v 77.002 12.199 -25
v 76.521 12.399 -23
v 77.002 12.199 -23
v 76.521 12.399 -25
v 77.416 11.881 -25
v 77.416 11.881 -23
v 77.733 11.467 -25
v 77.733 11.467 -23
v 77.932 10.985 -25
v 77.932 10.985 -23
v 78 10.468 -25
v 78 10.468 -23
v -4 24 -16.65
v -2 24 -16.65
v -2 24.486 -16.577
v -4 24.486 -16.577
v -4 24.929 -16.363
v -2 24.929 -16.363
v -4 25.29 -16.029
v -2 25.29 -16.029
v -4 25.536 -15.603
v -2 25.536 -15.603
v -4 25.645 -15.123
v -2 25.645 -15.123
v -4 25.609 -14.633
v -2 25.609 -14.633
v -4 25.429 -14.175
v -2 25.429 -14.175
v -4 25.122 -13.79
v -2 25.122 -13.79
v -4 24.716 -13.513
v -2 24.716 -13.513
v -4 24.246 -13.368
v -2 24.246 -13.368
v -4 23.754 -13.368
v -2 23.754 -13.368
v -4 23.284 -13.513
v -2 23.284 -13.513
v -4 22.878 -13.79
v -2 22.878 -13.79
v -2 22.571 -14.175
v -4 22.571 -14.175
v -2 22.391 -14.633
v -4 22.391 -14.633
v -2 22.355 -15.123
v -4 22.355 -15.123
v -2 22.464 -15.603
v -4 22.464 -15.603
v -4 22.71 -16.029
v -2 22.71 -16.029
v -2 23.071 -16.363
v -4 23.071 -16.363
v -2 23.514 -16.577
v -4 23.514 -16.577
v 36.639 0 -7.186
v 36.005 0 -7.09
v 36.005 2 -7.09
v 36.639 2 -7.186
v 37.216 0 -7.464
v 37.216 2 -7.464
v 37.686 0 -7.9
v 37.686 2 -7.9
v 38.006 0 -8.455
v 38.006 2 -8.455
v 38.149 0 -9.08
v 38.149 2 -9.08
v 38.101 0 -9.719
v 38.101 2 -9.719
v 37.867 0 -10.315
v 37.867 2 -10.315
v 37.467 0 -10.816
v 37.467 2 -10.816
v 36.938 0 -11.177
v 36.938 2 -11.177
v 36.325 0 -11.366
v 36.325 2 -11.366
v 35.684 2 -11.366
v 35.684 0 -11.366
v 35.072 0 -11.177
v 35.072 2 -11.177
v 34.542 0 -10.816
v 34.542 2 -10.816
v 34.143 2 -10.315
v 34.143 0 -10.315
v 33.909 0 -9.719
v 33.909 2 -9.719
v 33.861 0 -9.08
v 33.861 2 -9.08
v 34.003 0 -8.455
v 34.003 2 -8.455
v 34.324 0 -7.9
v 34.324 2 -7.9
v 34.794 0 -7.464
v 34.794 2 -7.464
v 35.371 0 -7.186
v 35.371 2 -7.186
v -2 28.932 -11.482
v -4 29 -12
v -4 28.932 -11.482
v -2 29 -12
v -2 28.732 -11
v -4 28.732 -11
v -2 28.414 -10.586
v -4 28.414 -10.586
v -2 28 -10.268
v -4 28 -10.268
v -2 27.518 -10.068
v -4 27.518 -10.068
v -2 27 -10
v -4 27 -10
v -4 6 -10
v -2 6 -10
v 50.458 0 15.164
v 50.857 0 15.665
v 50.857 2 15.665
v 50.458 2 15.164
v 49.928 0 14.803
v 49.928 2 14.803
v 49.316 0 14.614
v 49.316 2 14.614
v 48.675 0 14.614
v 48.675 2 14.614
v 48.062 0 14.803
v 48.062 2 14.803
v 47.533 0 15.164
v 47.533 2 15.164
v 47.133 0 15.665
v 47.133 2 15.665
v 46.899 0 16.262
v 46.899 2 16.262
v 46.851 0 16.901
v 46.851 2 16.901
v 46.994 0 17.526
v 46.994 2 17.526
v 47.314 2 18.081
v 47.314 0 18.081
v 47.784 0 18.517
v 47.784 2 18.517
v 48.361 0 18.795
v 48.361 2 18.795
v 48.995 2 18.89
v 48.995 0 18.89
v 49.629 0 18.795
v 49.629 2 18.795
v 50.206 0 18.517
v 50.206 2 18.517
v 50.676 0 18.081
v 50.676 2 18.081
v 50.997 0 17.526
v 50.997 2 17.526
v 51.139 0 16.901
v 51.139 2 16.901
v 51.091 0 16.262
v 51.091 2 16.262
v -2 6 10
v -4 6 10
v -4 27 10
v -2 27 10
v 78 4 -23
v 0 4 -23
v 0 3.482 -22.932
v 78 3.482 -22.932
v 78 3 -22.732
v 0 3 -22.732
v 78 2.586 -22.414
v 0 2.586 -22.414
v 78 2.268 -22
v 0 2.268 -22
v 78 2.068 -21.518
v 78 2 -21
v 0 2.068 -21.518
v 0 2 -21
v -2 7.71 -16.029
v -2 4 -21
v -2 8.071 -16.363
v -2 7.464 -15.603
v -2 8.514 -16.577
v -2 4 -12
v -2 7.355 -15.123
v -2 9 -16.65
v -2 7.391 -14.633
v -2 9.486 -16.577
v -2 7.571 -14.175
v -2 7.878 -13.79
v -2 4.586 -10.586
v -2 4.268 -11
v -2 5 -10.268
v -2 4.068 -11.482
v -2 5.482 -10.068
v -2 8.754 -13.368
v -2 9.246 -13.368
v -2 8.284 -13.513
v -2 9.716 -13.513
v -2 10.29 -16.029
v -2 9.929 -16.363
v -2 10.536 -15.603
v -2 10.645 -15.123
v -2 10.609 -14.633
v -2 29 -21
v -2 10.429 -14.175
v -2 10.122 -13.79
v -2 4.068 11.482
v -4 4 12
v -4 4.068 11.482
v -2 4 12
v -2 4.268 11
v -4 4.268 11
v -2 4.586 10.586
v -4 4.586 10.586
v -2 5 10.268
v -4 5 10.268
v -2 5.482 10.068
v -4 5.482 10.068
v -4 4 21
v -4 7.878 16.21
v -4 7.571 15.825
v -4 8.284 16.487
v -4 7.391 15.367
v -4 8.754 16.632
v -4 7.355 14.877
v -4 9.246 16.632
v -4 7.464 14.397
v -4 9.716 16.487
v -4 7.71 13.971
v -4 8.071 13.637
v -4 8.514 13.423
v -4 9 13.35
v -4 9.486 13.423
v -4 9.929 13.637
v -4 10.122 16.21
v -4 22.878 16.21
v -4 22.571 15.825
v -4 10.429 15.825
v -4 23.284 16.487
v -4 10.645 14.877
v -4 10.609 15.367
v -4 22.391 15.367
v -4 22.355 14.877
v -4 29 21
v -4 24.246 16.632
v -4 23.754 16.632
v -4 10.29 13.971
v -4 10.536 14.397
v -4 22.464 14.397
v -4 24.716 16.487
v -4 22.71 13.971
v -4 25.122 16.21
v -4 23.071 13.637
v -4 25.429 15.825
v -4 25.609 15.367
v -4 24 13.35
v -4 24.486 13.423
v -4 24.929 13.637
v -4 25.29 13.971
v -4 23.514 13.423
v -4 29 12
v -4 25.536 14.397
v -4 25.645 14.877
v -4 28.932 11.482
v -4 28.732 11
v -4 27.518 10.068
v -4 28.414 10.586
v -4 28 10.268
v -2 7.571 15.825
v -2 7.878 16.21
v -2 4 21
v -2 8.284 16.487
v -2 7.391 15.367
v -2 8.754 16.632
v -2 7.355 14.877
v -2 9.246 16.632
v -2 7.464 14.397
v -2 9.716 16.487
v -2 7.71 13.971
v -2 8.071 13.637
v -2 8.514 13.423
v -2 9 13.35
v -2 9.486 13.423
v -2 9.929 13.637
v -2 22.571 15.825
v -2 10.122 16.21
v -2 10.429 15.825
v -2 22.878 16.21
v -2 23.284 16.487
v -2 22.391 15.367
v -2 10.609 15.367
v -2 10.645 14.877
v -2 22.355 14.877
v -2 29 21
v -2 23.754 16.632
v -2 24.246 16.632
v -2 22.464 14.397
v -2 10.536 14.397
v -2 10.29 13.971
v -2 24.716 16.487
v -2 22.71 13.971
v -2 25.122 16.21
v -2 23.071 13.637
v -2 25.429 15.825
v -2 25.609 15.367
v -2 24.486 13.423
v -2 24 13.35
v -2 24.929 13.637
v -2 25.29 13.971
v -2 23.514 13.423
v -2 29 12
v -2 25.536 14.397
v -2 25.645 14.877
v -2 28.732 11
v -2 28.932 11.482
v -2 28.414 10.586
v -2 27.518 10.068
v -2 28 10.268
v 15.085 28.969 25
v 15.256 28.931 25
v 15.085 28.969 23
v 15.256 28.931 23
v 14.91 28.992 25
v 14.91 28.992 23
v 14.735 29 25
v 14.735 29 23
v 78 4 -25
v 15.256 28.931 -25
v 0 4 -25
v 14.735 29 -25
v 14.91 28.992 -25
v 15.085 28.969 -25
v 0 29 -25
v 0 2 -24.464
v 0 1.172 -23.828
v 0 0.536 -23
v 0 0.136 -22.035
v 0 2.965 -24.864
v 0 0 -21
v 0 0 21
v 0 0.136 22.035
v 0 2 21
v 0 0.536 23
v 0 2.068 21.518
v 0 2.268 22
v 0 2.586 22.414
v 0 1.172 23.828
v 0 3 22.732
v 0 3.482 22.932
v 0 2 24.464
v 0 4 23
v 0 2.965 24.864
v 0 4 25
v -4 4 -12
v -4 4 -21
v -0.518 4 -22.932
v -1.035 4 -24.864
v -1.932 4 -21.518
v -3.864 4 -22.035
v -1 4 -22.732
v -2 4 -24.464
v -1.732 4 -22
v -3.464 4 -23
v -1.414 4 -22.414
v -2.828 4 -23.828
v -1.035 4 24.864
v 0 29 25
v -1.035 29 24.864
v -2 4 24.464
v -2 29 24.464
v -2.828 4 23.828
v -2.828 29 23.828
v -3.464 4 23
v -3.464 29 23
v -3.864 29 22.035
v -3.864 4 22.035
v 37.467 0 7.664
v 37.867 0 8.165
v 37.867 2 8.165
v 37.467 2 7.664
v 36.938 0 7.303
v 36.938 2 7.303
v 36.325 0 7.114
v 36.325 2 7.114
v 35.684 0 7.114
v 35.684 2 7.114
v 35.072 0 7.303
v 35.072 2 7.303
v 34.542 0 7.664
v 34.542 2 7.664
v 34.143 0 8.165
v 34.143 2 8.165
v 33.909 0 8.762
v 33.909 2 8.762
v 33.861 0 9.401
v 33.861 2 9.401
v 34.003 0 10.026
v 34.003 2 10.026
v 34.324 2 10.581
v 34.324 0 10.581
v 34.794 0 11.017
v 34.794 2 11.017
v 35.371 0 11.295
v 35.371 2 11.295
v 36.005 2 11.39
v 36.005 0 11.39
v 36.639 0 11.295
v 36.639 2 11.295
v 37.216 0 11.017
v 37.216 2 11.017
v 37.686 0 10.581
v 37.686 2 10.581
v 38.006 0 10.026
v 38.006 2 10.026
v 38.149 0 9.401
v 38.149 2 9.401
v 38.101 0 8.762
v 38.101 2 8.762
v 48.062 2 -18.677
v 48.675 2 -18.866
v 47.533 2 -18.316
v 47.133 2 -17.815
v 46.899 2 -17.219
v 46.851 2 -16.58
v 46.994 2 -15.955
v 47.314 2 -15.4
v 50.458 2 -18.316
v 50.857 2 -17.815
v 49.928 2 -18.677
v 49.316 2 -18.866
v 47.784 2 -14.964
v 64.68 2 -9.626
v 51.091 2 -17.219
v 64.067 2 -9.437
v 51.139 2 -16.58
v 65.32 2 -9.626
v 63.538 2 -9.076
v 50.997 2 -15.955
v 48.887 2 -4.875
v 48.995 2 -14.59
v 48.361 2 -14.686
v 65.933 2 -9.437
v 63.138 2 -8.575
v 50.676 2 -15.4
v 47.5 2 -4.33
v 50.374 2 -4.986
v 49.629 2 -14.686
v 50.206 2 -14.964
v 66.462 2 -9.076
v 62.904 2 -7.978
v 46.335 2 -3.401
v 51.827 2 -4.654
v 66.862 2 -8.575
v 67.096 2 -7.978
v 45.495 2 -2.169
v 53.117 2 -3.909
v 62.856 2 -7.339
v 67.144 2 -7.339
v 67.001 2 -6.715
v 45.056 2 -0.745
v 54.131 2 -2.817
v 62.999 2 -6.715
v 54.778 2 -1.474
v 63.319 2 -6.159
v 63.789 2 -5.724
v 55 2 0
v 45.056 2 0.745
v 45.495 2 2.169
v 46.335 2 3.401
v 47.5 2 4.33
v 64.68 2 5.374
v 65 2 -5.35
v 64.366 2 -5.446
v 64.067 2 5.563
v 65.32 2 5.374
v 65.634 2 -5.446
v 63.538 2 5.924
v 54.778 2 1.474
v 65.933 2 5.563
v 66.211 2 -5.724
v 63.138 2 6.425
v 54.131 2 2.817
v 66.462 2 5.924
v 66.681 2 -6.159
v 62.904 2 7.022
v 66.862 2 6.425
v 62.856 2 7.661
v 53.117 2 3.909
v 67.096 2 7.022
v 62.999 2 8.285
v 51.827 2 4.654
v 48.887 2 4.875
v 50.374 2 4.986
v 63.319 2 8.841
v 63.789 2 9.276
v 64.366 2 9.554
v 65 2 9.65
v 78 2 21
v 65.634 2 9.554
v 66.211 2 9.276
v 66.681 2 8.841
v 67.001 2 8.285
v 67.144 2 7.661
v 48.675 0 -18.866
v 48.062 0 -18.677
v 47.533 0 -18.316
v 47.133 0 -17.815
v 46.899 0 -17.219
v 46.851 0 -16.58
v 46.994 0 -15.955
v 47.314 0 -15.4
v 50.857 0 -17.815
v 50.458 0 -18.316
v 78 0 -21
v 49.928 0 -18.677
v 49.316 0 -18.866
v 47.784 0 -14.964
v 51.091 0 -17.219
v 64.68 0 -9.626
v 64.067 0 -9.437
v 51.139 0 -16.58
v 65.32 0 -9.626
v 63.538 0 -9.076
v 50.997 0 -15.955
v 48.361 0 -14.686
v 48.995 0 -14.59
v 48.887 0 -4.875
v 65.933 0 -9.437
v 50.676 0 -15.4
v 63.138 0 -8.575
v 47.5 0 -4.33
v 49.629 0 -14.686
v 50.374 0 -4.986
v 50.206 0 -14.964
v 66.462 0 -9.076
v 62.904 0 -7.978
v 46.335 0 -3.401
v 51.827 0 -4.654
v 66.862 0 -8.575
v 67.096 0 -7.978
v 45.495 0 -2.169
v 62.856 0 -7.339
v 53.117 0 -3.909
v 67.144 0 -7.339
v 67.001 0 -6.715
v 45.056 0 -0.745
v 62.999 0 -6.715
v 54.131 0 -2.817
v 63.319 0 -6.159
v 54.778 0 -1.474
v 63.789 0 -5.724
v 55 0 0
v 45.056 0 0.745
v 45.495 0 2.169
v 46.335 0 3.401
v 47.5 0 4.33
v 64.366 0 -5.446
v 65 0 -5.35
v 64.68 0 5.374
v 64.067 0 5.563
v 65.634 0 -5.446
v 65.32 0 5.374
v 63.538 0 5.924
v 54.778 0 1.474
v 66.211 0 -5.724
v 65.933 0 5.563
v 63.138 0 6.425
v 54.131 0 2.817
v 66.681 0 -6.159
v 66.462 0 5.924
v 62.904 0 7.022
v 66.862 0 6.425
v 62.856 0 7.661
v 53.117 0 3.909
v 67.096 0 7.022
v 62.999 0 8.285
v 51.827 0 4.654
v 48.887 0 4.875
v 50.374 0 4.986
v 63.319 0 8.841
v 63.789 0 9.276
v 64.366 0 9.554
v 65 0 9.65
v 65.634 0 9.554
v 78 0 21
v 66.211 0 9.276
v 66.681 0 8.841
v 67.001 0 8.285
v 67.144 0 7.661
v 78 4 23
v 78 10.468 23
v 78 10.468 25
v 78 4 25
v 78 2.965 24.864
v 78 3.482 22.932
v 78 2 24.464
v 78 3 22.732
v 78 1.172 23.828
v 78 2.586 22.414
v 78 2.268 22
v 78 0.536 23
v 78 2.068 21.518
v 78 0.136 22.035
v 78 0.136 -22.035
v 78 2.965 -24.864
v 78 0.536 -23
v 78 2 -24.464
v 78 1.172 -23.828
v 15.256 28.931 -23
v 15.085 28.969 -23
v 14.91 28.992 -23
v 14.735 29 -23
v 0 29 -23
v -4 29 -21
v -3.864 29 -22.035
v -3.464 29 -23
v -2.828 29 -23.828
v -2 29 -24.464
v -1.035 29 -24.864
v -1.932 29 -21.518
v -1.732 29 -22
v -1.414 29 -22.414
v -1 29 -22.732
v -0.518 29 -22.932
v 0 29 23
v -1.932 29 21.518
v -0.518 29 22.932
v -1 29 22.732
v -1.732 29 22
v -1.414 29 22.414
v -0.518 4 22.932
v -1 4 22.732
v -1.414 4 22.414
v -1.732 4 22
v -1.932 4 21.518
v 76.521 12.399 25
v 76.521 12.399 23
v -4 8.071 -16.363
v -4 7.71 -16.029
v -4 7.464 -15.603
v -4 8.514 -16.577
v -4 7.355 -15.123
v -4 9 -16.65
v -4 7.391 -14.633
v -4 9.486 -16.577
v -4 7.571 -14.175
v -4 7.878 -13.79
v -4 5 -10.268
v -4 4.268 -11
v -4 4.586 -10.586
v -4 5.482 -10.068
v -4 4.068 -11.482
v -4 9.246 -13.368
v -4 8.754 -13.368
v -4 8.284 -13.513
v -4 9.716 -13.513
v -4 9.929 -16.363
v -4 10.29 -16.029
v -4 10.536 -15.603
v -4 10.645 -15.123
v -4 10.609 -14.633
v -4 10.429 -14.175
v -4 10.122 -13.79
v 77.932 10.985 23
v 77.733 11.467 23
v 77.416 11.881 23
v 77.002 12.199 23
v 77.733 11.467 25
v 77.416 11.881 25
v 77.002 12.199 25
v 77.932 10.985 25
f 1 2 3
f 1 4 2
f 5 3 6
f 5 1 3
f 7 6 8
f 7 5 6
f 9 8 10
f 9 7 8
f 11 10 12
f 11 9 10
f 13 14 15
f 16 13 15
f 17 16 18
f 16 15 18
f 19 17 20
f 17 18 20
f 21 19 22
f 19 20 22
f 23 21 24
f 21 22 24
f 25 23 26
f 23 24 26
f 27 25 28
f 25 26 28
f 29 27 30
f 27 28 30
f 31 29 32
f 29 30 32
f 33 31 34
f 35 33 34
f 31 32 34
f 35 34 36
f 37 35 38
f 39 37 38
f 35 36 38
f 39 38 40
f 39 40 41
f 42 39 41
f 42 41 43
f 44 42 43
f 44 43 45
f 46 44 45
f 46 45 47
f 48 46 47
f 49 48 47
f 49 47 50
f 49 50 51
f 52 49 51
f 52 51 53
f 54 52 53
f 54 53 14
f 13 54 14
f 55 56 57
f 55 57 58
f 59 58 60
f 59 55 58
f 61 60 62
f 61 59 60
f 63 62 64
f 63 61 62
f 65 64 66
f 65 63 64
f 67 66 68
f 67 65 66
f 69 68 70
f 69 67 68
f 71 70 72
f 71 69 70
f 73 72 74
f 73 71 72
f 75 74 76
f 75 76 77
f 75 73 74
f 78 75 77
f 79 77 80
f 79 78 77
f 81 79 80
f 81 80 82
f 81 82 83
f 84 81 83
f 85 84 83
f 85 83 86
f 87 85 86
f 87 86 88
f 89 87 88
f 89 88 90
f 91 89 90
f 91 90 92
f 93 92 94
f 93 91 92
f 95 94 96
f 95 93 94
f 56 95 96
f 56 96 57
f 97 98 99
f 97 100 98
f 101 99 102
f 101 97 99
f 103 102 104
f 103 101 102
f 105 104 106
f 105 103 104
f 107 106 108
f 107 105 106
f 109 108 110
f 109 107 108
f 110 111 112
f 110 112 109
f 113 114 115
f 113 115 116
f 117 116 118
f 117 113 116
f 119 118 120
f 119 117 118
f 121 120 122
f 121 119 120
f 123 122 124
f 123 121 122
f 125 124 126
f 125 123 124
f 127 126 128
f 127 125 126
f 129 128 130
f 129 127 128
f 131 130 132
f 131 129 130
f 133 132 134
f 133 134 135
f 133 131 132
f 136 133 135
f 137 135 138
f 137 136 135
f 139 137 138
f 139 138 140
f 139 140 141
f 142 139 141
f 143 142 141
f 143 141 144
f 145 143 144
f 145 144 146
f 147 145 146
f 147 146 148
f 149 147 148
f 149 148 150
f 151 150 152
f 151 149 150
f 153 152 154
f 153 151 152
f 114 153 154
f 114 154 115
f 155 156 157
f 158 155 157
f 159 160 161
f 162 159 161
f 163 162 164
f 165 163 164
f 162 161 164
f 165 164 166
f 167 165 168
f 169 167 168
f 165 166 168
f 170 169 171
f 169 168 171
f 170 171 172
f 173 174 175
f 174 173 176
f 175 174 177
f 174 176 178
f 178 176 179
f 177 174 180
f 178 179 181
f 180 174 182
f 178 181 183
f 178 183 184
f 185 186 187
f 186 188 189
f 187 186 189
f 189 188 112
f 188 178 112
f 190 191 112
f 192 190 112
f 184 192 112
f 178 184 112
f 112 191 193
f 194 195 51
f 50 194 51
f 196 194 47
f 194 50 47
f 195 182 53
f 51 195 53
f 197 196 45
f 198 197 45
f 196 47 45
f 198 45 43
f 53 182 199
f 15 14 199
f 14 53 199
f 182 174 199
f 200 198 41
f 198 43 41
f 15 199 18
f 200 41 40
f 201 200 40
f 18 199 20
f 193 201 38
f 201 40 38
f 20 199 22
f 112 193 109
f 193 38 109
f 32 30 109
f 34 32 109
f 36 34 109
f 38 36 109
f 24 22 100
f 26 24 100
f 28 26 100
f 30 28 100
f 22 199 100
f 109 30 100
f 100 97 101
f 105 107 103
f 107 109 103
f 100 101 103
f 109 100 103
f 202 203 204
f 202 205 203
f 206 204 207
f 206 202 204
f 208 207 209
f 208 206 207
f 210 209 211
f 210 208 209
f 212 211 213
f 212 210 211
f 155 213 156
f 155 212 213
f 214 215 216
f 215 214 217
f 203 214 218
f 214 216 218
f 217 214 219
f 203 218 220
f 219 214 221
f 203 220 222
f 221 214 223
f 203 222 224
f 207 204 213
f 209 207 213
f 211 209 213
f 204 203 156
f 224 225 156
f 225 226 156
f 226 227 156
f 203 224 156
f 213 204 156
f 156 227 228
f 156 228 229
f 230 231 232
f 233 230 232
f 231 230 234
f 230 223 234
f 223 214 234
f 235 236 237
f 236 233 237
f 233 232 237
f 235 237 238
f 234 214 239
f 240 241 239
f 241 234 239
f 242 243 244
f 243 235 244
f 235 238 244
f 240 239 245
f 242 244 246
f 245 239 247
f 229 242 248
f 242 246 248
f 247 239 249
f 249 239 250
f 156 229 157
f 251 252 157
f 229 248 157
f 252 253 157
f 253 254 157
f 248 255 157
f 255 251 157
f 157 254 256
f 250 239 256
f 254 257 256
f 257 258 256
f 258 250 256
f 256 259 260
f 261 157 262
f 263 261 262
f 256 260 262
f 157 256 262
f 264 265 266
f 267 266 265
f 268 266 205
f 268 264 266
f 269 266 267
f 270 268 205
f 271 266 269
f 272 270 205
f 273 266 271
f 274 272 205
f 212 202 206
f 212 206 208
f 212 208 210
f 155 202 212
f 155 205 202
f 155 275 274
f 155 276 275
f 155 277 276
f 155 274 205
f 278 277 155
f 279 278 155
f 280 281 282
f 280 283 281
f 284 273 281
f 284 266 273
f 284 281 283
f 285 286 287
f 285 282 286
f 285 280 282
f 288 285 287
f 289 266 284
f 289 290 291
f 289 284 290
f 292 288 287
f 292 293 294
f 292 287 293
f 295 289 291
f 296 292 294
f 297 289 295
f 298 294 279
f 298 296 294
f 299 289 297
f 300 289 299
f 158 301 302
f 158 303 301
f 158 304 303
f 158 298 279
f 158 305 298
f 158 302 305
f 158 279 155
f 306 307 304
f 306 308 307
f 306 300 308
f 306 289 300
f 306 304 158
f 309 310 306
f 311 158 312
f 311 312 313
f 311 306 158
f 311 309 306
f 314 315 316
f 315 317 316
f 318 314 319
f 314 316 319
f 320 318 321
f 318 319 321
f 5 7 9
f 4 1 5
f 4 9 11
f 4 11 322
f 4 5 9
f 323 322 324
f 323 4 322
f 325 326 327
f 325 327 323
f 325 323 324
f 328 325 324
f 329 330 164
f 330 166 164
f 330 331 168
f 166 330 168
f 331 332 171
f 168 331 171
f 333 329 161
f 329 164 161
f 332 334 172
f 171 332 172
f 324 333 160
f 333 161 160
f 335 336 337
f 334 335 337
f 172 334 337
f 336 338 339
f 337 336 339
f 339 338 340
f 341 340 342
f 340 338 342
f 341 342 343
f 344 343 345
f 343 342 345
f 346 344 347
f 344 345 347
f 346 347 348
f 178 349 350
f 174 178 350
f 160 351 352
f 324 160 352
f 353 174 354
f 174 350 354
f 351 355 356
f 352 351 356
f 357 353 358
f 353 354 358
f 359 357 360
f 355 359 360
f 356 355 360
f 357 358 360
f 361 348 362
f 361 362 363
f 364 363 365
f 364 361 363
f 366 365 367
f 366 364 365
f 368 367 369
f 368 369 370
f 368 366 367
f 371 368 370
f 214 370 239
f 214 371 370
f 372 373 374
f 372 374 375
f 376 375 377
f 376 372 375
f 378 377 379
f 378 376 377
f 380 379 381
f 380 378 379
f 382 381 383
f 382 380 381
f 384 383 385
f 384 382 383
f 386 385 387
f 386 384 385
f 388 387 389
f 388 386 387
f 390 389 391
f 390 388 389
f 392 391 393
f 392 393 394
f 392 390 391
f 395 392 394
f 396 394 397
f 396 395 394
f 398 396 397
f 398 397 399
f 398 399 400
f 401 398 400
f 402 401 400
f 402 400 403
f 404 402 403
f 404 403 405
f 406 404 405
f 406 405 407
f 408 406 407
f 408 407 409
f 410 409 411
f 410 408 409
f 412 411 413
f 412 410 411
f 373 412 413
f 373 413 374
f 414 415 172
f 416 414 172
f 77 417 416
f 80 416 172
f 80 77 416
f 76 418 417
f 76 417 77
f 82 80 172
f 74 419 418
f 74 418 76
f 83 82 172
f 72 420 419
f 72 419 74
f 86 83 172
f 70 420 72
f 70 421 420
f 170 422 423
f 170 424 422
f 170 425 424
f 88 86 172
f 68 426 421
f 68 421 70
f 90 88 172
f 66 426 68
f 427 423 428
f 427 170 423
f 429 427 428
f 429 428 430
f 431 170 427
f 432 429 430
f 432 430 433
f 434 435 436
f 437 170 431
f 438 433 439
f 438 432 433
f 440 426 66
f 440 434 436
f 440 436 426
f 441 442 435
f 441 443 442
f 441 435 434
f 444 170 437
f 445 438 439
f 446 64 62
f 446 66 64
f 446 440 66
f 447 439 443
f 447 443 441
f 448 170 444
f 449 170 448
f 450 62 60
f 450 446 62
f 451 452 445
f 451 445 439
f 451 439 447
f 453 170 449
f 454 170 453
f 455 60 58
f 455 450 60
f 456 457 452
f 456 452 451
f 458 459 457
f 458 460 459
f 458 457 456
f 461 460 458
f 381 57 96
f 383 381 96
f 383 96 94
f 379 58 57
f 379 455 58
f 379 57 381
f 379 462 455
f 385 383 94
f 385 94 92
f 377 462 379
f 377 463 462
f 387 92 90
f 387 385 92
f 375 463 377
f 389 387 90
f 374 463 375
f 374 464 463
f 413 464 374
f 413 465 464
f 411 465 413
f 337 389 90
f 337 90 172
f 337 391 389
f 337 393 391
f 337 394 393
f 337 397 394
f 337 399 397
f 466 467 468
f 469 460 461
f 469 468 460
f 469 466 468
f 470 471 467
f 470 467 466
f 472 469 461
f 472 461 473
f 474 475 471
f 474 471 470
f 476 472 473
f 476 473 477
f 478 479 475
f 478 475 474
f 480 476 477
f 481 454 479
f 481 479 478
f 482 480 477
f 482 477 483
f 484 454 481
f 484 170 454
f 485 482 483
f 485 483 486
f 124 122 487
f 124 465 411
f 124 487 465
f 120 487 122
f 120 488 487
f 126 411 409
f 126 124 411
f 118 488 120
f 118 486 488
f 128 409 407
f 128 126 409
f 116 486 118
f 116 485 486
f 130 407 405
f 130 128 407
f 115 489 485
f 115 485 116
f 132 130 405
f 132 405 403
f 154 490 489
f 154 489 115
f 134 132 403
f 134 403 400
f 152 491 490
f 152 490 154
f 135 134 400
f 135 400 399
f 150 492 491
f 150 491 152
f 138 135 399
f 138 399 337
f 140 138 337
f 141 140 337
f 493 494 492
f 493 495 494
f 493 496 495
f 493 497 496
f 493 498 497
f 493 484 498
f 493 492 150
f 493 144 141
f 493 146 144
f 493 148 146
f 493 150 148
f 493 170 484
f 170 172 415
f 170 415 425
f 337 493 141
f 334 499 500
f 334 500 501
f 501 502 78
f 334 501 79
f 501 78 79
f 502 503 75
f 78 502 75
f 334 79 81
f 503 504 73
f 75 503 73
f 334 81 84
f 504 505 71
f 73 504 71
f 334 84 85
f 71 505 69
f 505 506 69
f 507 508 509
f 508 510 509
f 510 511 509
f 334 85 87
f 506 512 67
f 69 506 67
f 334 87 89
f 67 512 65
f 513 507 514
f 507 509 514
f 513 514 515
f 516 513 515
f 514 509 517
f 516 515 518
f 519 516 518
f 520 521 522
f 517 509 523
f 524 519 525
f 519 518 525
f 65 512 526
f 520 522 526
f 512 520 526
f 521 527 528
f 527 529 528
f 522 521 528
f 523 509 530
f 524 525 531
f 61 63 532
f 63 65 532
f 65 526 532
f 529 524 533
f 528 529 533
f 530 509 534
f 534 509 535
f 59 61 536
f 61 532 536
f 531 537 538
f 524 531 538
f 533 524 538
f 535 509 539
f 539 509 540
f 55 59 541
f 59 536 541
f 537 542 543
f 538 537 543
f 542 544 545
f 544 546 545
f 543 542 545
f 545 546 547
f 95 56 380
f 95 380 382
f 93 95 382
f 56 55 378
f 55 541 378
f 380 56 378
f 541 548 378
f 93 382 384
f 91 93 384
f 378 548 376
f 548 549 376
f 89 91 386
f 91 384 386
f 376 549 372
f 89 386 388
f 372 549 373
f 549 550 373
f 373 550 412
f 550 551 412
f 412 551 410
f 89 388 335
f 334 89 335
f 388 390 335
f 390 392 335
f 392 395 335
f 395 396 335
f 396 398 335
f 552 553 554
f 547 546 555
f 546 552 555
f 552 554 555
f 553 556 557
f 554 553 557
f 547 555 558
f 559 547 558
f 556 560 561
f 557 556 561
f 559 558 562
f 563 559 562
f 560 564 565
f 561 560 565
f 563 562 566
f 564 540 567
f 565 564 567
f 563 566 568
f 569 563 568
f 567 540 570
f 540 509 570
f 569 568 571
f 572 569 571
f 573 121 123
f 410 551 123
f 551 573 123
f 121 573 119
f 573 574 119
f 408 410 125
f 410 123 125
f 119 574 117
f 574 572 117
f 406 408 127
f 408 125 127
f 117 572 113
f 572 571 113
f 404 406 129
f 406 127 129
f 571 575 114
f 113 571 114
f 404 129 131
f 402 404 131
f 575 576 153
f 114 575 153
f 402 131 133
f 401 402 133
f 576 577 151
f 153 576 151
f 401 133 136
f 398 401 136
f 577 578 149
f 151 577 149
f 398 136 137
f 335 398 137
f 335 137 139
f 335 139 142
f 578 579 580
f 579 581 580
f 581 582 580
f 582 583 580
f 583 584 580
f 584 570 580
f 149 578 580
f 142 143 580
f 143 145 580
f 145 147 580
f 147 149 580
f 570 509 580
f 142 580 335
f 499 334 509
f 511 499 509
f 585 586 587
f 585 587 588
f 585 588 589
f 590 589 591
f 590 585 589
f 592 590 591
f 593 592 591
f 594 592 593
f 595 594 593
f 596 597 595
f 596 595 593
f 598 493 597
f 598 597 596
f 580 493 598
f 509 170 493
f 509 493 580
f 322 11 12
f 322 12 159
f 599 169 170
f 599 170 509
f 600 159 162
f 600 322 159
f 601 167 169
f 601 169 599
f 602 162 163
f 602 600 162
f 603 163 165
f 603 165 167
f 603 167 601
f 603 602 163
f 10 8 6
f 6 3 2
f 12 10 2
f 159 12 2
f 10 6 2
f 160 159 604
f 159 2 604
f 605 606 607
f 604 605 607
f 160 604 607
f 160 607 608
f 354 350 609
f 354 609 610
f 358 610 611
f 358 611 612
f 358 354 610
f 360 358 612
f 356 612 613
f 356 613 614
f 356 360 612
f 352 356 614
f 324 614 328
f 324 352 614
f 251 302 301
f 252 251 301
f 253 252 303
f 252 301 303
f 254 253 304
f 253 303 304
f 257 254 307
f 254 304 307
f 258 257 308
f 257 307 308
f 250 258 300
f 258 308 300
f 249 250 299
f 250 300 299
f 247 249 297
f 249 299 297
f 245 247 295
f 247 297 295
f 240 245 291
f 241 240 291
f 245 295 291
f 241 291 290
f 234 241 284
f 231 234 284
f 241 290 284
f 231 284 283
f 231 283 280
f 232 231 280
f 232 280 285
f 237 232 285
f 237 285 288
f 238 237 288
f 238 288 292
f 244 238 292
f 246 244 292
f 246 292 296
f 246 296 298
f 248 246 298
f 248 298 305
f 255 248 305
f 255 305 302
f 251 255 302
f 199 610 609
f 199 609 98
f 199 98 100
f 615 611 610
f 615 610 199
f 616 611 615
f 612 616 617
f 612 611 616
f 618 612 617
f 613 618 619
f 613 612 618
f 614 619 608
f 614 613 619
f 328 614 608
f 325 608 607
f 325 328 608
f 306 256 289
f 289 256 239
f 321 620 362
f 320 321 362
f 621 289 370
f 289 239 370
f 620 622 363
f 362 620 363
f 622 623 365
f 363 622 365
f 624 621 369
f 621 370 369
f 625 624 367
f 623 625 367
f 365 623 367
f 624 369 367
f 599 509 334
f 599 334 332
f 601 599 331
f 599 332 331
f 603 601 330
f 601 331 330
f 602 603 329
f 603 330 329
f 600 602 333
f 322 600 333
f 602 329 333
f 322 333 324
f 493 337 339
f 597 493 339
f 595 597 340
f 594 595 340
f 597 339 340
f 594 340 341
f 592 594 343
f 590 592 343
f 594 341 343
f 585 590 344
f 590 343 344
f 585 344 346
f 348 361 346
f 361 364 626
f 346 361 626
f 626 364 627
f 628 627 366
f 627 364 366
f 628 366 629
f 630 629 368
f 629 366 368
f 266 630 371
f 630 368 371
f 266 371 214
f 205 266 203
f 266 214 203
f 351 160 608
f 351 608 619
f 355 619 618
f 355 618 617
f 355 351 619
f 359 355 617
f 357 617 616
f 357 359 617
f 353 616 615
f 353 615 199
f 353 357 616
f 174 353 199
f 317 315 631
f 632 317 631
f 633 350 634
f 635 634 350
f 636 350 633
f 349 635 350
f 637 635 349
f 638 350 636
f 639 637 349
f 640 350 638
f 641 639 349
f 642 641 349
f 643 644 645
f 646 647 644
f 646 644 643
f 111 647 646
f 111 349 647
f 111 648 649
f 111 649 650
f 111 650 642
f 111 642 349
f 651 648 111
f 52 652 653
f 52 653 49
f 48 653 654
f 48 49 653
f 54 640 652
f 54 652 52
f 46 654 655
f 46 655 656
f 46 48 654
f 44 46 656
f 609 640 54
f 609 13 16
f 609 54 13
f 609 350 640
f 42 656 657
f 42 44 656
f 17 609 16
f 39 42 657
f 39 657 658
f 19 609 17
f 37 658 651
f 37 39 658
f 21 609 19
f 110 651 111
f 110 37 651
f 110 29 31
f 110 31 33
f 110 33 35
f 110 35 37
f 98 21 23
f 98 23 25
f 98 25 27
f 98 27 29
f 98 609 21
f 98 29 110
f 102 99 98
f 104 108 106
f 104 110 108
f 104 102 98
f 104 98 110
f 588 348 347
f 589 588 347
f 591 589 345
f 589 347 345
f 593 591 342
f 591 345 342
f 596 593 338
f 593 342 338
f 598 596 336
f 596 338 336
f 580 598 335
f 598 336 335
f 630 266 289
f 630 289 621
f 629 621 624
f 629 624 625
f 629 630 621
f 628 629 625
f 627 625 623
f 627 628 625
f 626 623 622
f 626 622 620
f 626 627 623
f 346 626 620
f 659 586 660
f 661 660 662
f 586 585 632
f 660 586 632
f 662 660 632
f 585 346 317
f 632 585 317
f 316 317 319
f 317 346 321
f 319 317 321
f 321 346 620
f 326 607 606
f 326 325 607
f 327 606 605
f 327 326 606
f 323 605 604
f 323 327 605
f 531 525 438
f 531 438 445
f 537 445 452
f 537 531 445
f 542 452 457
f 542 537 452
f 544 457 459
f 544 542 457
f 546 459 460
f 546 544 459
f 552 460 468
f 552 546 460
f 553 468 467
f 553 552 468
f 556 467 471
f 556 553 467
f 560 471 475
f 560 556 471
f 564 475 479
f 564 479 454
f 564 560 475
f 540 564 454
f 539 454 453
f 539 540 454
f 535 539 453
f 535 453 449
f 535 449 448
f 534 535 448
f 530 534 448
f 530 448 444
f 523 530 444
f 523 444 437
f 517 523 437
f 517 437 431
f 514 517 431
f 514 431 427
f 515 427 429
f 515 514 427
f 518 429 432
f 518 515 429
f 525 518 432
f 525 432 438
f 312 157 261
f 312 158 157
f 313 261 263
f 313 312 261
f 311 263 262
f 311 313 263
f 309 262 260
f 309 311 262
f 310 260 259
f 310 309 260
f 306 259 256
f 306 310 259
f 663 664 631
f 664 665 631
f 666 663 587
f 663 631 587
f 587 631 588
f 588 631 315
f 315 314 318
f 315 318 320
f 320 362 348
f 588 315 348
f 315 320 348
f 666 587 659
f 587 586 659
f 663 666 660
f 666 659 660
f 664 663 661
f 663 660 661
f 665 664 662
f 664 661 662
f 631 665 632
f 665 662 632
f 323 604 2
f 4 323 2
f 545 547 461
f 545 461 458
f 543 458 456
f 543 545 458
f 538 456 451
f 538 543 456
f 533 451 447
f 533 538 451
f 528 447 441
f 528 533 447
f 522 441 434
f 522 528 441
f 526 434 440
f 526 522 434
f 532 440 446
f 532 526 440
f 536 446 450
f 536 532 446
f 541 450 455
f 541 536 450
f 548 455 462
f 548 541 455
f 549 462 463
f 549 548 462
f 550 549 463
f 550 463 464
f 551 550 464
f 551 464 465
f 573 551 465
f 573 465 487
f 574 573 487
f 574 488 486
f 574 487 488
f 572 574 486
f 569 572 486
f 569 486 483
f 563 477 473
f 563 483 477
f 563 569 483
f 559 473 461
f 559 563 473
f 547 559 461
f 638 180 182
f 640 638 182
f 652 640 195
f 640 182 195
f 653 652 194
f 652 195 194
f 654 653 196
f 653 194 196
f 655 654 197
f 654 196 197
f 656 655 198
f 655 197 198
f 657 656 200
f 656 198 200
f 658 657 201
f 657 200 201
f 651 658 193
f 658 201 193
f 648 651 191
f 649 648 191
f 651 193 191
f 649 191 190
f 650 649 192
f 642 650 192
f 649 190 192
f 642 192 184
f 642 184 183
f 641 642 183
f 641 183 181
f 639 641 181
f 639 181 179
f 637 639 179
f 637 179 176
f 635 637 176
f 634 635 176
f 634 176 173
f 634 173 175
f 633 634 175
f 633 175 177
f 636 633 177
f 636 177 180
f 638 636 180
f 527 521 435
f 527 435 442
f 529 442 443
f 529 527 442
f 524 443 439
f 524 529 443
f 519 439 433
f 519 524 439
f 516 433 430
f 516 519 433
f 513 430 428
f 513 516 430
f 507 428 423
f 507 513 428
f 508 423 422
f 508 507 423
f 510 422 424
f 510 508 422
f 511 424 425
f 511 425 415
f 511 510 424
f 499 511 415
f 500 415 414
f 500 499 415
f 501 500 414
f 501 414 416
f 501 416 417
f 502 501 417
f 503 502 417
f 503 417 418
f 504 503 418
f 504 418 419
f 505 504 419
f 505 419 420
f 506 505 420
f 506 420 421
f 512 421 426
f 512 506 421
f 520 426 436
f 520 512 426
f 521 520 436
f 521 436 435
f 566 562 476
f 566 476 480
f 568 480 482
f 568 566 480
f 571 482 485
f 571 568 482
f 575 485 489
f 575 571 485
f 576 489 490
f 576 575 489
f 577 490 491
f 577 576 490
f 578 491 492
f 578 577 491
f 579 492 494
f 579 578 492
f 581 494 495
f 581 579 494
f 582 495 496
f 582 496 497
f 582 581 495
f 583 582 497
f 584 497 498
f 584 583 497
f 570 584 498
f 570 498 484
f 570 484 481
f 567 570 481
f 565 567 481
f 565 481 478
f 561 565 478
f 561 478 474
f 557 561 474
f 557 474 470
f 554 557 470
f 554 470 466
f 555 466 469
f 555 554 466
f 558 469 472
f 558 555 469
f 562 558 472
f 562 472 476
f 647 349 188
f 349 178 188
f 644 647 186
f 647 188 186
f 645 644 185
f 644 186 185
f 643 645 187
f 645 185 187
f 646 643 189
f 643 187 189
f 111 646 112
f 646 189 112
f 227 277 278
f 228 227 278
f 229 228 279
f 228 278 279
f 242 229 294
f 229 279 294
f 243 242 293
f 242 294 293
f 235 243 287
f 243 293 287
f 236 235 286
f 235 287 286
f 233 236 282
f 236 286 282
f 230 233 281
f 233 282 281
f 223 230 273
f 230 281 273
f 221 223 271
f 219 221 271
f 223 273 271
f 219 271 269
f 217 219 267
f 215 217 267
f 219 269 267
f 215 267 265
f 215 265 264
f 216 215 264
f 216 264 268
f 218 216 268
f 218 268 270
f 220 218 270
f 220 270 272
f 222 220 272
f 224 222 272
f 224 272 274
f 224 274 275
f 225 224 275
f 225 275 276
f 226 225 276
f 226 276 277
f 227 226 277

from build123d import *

# Parameters (mm, degrees)
EXTRUDE_1_DEPTH          = 78
EXTRUDE_START            = -4
EXTRUDE_1_2_OUTLINE_R    = 2.1
EXTRUDE_1_2_DEPTH        = 4
EXTRUDE_START_2          = -1
EXTRUDE_1_3_OUTLINE_R    = 5
EXTRUDE_1_3_OUTLINE_R_2  = 2.5
EXTRUDE_1_3_DEPTH        = 30
EXTRUDE_START_3          = -25
EXTRUDE_1_4_DEPTH        = 2
EXTRUDE_2_DEPTH          = 2
CUT_EXTRUDE_1_DEPTH      = 98.082439195
FILLET_1_R               = 2
EXTRUDE_START_4          = -2
SKETCH_4_R               = 2.1
SKETCH_4_R_2             = 1
EXTRUDE_3_DEPTH          = 2
HOLE_WIZARD_M4_1_D       = 3.3
HOLE_WIZARD_M4_1_DEPTH   = 11.5
HOLE_WIZARD_M4_1_TIP     = 0.991420021
SKETCH_8_W               = 20
SKETCH_8_H               = 25
CUT_EXTRUDE_2_DEPTH      = 91.498618774
FILLET_2_R               = 2
SKETCH_9_R               = 2.5
SKETCH_9_R_2             = 2.15
EXTRUDE_4_DEPTH          = 2
PATTERN_CIRCULAR_2_COUNT = 3


with BuildPart() as part:
    # ﾎﾞｽ - 押し出し1: read off the stored shape, not the designer's step
    # ﾎﾞｽ - 押し出し1 outline → ﾎﾞｽ - 押し出し1 (new body)
    with BuildSketch(Plane.YZ):
        with BuildLine():
            Line((29, 25), (4, 25))
            ThreePointArc((4, 25), (1.171572875, 23.828427125), (0, 21))
            Line((0, 21), (0, -21))
            ThreePointArc((0, -21), (1.171572875, -23.828427125), (4, -25))
            Line((4, -25), (29, -25))
            Line((29, -25), (29, -23))
            Line((29, -23), (4, -23))
            ThreePointArc((4, -23), (2.585786438, -22.414213562), (2, -21))
            Line((2, -21), (2, 21))
            ThreePointArc((2, 21), (2.585786438, 22.414213562), (4, 23))
            Line((4, 23), (29, 23))
            Line((29, 23), (29, 25))
        make_face()
    extrude(amount=EXTRUDE_1_DEPTH)

    # Extrude 1 2 outline → Extrude 1 2 (add)
    # profile 1 of 2: a face of its own
    with BuildSketch(Plane.YZ.offset(EXTRUDE_START)):
        with BuildLine():
            ThreePointArc((4, 8), (4.228361402, 6.851949703), (4.878679656, 5.878679656))
            ThreePointArc((4.878679656, 5.878679656), (5.851949703, 5.228361402), (7, 5))
            Line((7, 5), (26, 5))
            ThreePointArc((26, 5), (27.148050297, 5.228361402), (28.121320344, 5.878679656))
            ThreePointArc((28.121320344, 5.878679656), (28.771638598, 6.851949703), (29, 8))
            Line((29, 8), (29, 25))
            Line((29, 25), (4, 25))
            Line((4, 25), (4, 8))
        make_face()
        with Locations((9, 15)):
            Circle(EXTRUDE_1_2_OUTLINE_R, mode=Mode.SUBTRACT)
        with Locations((24, 15)):
            Circle(EXTRUDE_1_2_OUTLINE_R, mode=Mode.SUBTRACT)
    # profile 2 of 2: a face of its own
    with BuildSketch(Plane.YZ.offset(EXTRUDE_START)):
        with BuildLine():
            Line((4, -25), (29, -25))
            Line((29, -25), (29, -8))
            ThreePointArc((29, -8), (28.771638598, -6.851949703), (28.121320344, -5.878679656))
            ThreePointArc((28.121320344, -5.878679656), (27.148050297, -5.228361402), (26, -5))
            Line((26, -5), (7, -5))
            ThreePointArc((7, -5), (5.851949703, -5.228361402), (4.878679656, -5.878679656))
            ThreePointArc((4.878679656, -5.878679656), (4.228361402, -6.851949703), (4, -8))
            Line((4, -8), (4, -25))
        make_face()
        with Locations((9, -15)):
            Circle(EXTRUDE_1_2_OUTLINE_R, mode=Mode.SUBTRACT)
        with Locations((24, -15)):
            Circle(EXTRUDE_1_2_OUTLINE_R, mode=Mode.SUBTRACT)
    extrude(amount=EXTRUDE_1_2_DEPTH)

    # Extrude 1 3 outline → Extrude 1 3 (cut)
    with BuildSketch(Plane(origin=(0, 0, 0), x_dir=(1, 0, 0), z_dir=(0, 1, 0)).offset(EXTRUDE_START_2)):
        with Locations((50, 0)):
            Circle(EXTRUDE_1_3_OUTLINE_R)
        with BuildLine():
            Line((0, -5), (-2, -5))
            Line((-2, -5), (-2, -21))
            ThreePointArc((-2, -21), (-1.414213562, -22.414213562), (0, -23))
            Line((0, -23), (0, -5))
        make_face()
        with BuildLine():
            ThreePointArc((0, -25), (-2.828427125, -23.828427125), (-4, -21))
            Line((-4, -21), (-4, -25))
            Line((-4, -25), (0, -25))
        make_face()
        with BuildLine():
            Line((0, 5), (0, 23))
            ThreePointArc((0, 23), (-1.414213562, 22.414213562), (-2, 21))
            Line((-2, 21), (-2, 5))
            Line((-2, 5), (0, 5))
        make_face()
        with BuildLine():
            ThreePointArc((-4, 21), (-2.828427125, 23.828427125), (0, 25))
            Line((0, 25), (-4, 25))
            Line((-4, 25), (-4, 21))
        make_face()
        with Locations((36.004809472, 9.240381057)):
            Circle(EXTRUDE_1_3_OUTLINE_R_2)
        with Locations((48.995190528, -16.740381057)):
            Circle(EXTRUDE_1_3_OUTLINE_R_2)
        with Locations((65, -7.5)):
            Circle(EXTRUDE_1_3_OUTLINE_R_2)
        with Locations((65, 7.5)):
            Circle(EXTRUDE_1_3_OUTLINE_R_2)
        with Locations((36.004809472, -9.240381057)):
            Circle(EXTRUDE_1_3_OUTLINE_R_2)
        with Locations((48.995190528, 16.740381057)):
            Circle(EXTRUDE_1_3_OUTLINE_R_2)
    extrude(amount=EXTRUDE_1_3_DEPTH, mode=Mode.SUBTRACT)

    # Extrude 1 4 outline → Extrude 1 4 (cut)
    with BuildSketch(Plane.XY.offset(EXTRUDE_START_3)):
        with BuildLine():
            ThreePointArc((76.562947136, 7.421535507), (77.140312684, 7.145469965), (77.600920715, 6.701168941))
            ThreePointArc((77.600920715, 6.701168941), (77.89760921, 6.134124767), (78, 5.502397544))
            Line((78, 5.502397544), (78, 29))
            Line((78, 29), (2.712718898, 29))
            ThreePointArc((2.712718898, 29), (2.855262652, 28.994913852), (2.997081408, 28.979681278))
            ThreePointArc((2.997081408, 28.979681278), (3.137453853, 28.954379753), (3.275666034, 28.919137963))
            Line((3.275666034, 28.919137963), (76.562947136, 7.421535507))
        make_face()
    extrude(amount=EXTRUDE_1_4_DEPTH, mode=Mode.SUBTRACT)

    # ｽｹｯﾁ2 → ﾎﾞｽ - 押し出し2 (add)
    with BuildSketch(Plane(origin=(0, 0, -25), x_dir=(-1, 0, 0), z_dir=(0, 0, -1))):
        with BuildLine():
            ThreePointArc((-2.997081408, 28.979681278), (-2.855262652, 28.994913852), (-2.712718898, 29))
            Line((-2.712718898, 29), (-78, 29))
            Line((-78, 29), (-78, 5.502397544))
            ThreePointArc((-78, 5.502397544), (-77.89760921, 6.134124767), (-77.600920715, 6.701168941))
            ThreePointArc((-77.600920715, 6.701168941), (-77.140312684, 7.145469965), (-76.562947136, 7.421535507))
            Line((-76.562947136, 7.421535507), (-3.275666034, 28.919137963))
            ThreePointArc((-3.275666034, 28.919137963), (-3.137453853, 28.954379753), (-2.997081408, 28.979681278))
        make_face()
    extrude(amount=-EXTRUDE_2_DEPTH)

    # ｽｹｯﾁ3 → ｶｯﾄ - 押し出し1 (cut, through all)
    with BuildSketch(Plane.XY.offset(25)):
        Polygon((78, 29), (15, 29), (78, 12), align=None)
    extrude(amount=-CUT_EXTRUDE_1_DEPTH, mode=Mode.SUBTRACT)

    # ﾌｨﾚｯﾄ1
    fillet_1_edges = [part.edges().sort_by_distance(p)[0] for p in [
        (15, 29, -24),
        (78, 12, -24),
        (15, 29, 24),
        (78, 12, 24),
    ]]
    fillet(fillet_1_edges, radius=FILLET_1_R)

    # ｽｹｯﾁ4 → ﾎﾞｽ - 押し出し3 (add)
    # profile 1 of 2: a face of its own
    with BuildSketch(Plane(origin=(-2, 0, 0), x_dir=(0, 0, -1), z_dir=(1, 0, 0)).offset(EXTRUDE_START_4)):
        with Locations((-15, 9)):
            Circle(SKETCH_4_R)
        with Locations(Location((-15, 9, 0), (0, 0, 90))):
            Circle(SKETCH_4_R_2, mode=Mode.SUBTRACT)
    # profile 2 of 2: a face of its own
    with BuildSketch(Plane(origin=(-2, 0, 0), x_dir=(0, 0, -1), z_dir=(1, 0, 0)).offset(EXTRUDE_START_4)):
        with Locations((-15, 24)):
            Circle(SKETCH_4_R)
        with Locations(Location((-15, 24, 0), (0, 0, 90))):
            Circle(SKETCH_4_R_2, mode=Mode.SUBTRACT)
    extrude_3 = extrude(amount=EXTRUDE_3_DEPTH)

    # ﾐﾗｰ2: ﾎﾞｽ - 押し出し3 across plane
    add(extrude_3.mirror(Plane.XY))

    # M4 ねじ穴1
    with Locations(Plane.ZY.offset(4)):
        with Locations((-15, 9), (-15, 24), (15, 24), (15, 9)):
            Hole(HOLE_WIZARD_M4_1_D / 2, depth=HOLE_WIZARD_M4_1_DEPTH)
            with Locations((0, 0, -(HOLE_WIZARD_M4_1_DEPTH + HOLE_WIZARD_M4_1_TIP / 2))):  # 118° drill point
                Cone(0, HOLE_WIZARD_M4_1_D / 2, HOLE_WIZARD_M4_1_TIP, mode=Mode.SUBTRACT)

    # ｽｹｯﾁ8 → ｶｯﾄ - 押し出し2 (cut, through all)
    with BuildSketch(Plane.ZY.offset(4)):
        with Locations((0, 16.5)):
            Rectangle(SKETCH_8_W, SKETCH_8_H)
    extrude(amount=-CUT_EXTRUDE_2_DEPTH, mode=Mode.SUBTRACT)

    # ﾌｨﾚｯﾄ2
    fillet_2_edges = [part.edges().sort_by_distance(p)[0] for p in [
        (-3, 29, 10),
        (-3, 4, 10),
        (-3, 4, -10),
        (-3, 29, -10),
    ]]
    fillet(fillet_2_edges, radius=FILLET_2_R)

    # ｽｹｯﾁ9 → ﾎﾞｽ - 押し出し4 (add)
    # profile 1 of 2: a face of its own
    with BuildSketch(Plane(origin=(0, 2, 0), x_dir=(1, 0, 0), z_dir=(0, 1, 0)).offset(EXTRUDE_START_4)):
        with Locations((48.995190528, 16.740381057)):
            Circle(SKETCH_9_R)
        with Locations(Location((48.995190528, 16.740381057, 0), (0, 0, 270))):
            Circle(SKETCH_9_R_2, mode=Mode.SUBTRACT)
    # profile 2 of 2: a face of its own
    with BuildSketch(Plane(origin=(0, 2, 0), x_dir=(1, 0, 0), z_dir=(0, 1, 0)).offset(EXTRUDE_START_4)):
        with Locations((36.004809472, 9.240381057)):
            Circle(SKETCH_9_R)
        with Locations(Location((36.004809472, 9.240381057, 0), (0, 0, 270))):
            Circle(SKETCH_9_R_2, mode=Mode.SUBTRACT)
    extrude_4 = extrude(amount=EXTRUDE_4_DEPTH)

    # 円形ﾊﾟﾀｰﾝ2: ﾎﾞｽ - 押し出し4 ×3 about axis
    pattern_circular_2_axis = Axis((50, 0, 0), (0, 1, 0))
    for i in range(1, PATTERN_CIRCULAR_2_COUNT):
        add(extrude_4.rotate(pattern_circular_2_axis, i * 360 / PATTERN_CIRCULAR_2_COUNT))


solid = part.part
